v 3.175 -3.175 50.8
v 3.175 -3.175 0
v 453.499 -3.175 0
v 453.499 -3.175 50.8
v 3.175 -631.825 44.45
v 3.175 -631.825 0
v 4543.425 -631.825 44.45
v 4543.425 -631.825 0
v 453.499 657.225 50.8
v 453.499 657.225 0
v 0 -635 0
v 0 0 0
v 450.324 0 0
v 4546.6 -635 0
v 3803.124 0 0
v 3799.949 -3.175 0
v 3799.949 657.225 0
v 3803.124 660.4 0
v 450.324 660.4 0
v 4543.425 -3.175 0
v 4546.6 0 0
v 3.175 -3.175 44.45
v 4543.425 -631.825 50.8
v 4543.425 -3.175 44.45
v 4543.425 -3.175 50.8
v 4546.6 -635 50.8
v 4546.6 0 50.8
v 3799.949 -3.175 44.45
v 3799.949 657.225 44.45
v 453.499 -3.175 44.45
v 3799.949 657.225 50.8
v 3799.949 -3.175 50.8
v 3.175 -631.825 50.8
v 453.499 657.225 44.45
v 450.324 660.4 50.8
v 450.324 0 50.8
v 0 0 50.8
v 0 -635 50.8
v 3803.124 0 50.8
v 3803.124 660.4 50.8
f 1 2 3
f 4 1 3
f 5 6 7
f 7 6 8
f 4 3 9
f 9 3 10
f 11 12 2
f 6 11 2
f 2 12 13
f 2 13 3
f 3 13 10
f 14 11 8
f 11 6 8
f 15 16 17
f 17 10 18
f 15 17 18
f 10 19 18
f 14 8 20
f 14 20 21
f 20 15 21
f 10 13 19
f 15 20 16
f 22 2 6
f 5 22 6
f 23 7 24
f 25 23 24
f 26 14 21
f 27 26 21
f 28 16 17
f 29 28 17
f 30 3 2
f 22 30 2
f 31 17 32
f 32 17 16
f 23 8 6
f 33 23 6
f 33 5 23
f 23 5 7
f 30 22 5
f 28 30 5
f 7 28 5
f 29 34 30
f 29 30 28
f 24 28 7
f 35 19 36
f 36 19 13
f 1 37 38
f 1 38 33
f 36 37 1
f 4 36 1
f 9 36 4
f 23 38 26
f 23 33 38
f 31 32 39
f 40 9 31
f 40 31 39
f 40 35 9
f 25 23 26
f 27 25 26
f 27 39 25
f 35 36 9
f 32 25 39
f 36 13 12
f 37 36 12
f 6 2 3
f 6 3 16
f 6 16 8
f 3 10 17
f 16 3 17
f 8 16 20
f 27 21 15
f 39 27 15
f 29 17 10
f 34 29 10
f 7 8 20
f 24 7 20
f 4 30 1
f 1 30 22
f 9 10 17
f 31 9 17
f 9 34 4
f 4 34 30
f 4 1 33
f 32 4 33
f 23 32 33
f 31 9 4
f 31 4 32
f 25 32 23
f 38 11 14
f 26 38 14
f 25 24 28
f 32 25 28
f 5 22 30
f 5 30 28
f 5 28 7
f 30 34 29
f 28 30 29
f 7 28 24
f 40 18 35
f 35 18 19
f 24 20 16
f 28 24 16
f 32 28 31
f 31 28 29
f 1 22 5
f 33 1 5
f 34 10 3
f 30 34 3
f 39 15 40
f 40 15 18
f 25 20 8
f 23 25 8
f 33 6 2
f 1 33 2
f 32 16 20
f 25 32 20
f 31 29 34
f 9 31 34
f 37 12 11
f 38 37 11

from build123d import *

# Parameters (mm, degrees)
F1_DEPTH = 50.8
F2_DEPTH = 44.45
F4_DEPTH = 6.35


with BuildPart() as f1:
    # F0 (on Top) → F1 (new body)
    with BuildSketch(Plane.XY):
        Polygon((450.324121, 0), (0, 0), (0, -635), (4546.6, -635), (4546.6, 0), (3803.124121, 0), (3803.124121, 660.4), (450.324121, 660.4), align=None)
        Polygon((3.175, -3.175), (453.499121, -3.175), (453.499121, 657.225), (3799.949121, 657.225), (3799.949121, -3.175), (4543.425, -3.175), (4543.425, -631.825), (3.175, -631.825), align=None, mode=Mode.SUBTRACT)
    extrude(amount=F1_DEPTH)


with BuildPart() as f2:
    # F0 (on Top) → F2 (new body)
    with BuildSketch(Plane.XY):
        Polygon((453.499121, 657.225), (453.499121, -3.175), (3.175, -3.175), (3.175, -631.825), (4543.425, -631.825), (4543.425, -3.175), (3799.949121, -3.175), (3799.949121, 657.225), align=None)
    extrude(amount=F2_DEPTH)


with BuildPart() as f4:
    # F3 (on face) → F4 (new body)
    with BuildSketch(Plane.XY.offset(44.45)):
        Polygon((3799.949121, 657.225), (453.499121, 657.225), (453.499121, -3.175), (3.175, -3.175), (3.175, -631.825), (4543.425, -631.825), (4543.425, -3.175), (3799.949121, -3.175), align=None)
    extrude(amount=F4_DEPTH)


solid = Compound([f1.part, f2.part, f4.part])
